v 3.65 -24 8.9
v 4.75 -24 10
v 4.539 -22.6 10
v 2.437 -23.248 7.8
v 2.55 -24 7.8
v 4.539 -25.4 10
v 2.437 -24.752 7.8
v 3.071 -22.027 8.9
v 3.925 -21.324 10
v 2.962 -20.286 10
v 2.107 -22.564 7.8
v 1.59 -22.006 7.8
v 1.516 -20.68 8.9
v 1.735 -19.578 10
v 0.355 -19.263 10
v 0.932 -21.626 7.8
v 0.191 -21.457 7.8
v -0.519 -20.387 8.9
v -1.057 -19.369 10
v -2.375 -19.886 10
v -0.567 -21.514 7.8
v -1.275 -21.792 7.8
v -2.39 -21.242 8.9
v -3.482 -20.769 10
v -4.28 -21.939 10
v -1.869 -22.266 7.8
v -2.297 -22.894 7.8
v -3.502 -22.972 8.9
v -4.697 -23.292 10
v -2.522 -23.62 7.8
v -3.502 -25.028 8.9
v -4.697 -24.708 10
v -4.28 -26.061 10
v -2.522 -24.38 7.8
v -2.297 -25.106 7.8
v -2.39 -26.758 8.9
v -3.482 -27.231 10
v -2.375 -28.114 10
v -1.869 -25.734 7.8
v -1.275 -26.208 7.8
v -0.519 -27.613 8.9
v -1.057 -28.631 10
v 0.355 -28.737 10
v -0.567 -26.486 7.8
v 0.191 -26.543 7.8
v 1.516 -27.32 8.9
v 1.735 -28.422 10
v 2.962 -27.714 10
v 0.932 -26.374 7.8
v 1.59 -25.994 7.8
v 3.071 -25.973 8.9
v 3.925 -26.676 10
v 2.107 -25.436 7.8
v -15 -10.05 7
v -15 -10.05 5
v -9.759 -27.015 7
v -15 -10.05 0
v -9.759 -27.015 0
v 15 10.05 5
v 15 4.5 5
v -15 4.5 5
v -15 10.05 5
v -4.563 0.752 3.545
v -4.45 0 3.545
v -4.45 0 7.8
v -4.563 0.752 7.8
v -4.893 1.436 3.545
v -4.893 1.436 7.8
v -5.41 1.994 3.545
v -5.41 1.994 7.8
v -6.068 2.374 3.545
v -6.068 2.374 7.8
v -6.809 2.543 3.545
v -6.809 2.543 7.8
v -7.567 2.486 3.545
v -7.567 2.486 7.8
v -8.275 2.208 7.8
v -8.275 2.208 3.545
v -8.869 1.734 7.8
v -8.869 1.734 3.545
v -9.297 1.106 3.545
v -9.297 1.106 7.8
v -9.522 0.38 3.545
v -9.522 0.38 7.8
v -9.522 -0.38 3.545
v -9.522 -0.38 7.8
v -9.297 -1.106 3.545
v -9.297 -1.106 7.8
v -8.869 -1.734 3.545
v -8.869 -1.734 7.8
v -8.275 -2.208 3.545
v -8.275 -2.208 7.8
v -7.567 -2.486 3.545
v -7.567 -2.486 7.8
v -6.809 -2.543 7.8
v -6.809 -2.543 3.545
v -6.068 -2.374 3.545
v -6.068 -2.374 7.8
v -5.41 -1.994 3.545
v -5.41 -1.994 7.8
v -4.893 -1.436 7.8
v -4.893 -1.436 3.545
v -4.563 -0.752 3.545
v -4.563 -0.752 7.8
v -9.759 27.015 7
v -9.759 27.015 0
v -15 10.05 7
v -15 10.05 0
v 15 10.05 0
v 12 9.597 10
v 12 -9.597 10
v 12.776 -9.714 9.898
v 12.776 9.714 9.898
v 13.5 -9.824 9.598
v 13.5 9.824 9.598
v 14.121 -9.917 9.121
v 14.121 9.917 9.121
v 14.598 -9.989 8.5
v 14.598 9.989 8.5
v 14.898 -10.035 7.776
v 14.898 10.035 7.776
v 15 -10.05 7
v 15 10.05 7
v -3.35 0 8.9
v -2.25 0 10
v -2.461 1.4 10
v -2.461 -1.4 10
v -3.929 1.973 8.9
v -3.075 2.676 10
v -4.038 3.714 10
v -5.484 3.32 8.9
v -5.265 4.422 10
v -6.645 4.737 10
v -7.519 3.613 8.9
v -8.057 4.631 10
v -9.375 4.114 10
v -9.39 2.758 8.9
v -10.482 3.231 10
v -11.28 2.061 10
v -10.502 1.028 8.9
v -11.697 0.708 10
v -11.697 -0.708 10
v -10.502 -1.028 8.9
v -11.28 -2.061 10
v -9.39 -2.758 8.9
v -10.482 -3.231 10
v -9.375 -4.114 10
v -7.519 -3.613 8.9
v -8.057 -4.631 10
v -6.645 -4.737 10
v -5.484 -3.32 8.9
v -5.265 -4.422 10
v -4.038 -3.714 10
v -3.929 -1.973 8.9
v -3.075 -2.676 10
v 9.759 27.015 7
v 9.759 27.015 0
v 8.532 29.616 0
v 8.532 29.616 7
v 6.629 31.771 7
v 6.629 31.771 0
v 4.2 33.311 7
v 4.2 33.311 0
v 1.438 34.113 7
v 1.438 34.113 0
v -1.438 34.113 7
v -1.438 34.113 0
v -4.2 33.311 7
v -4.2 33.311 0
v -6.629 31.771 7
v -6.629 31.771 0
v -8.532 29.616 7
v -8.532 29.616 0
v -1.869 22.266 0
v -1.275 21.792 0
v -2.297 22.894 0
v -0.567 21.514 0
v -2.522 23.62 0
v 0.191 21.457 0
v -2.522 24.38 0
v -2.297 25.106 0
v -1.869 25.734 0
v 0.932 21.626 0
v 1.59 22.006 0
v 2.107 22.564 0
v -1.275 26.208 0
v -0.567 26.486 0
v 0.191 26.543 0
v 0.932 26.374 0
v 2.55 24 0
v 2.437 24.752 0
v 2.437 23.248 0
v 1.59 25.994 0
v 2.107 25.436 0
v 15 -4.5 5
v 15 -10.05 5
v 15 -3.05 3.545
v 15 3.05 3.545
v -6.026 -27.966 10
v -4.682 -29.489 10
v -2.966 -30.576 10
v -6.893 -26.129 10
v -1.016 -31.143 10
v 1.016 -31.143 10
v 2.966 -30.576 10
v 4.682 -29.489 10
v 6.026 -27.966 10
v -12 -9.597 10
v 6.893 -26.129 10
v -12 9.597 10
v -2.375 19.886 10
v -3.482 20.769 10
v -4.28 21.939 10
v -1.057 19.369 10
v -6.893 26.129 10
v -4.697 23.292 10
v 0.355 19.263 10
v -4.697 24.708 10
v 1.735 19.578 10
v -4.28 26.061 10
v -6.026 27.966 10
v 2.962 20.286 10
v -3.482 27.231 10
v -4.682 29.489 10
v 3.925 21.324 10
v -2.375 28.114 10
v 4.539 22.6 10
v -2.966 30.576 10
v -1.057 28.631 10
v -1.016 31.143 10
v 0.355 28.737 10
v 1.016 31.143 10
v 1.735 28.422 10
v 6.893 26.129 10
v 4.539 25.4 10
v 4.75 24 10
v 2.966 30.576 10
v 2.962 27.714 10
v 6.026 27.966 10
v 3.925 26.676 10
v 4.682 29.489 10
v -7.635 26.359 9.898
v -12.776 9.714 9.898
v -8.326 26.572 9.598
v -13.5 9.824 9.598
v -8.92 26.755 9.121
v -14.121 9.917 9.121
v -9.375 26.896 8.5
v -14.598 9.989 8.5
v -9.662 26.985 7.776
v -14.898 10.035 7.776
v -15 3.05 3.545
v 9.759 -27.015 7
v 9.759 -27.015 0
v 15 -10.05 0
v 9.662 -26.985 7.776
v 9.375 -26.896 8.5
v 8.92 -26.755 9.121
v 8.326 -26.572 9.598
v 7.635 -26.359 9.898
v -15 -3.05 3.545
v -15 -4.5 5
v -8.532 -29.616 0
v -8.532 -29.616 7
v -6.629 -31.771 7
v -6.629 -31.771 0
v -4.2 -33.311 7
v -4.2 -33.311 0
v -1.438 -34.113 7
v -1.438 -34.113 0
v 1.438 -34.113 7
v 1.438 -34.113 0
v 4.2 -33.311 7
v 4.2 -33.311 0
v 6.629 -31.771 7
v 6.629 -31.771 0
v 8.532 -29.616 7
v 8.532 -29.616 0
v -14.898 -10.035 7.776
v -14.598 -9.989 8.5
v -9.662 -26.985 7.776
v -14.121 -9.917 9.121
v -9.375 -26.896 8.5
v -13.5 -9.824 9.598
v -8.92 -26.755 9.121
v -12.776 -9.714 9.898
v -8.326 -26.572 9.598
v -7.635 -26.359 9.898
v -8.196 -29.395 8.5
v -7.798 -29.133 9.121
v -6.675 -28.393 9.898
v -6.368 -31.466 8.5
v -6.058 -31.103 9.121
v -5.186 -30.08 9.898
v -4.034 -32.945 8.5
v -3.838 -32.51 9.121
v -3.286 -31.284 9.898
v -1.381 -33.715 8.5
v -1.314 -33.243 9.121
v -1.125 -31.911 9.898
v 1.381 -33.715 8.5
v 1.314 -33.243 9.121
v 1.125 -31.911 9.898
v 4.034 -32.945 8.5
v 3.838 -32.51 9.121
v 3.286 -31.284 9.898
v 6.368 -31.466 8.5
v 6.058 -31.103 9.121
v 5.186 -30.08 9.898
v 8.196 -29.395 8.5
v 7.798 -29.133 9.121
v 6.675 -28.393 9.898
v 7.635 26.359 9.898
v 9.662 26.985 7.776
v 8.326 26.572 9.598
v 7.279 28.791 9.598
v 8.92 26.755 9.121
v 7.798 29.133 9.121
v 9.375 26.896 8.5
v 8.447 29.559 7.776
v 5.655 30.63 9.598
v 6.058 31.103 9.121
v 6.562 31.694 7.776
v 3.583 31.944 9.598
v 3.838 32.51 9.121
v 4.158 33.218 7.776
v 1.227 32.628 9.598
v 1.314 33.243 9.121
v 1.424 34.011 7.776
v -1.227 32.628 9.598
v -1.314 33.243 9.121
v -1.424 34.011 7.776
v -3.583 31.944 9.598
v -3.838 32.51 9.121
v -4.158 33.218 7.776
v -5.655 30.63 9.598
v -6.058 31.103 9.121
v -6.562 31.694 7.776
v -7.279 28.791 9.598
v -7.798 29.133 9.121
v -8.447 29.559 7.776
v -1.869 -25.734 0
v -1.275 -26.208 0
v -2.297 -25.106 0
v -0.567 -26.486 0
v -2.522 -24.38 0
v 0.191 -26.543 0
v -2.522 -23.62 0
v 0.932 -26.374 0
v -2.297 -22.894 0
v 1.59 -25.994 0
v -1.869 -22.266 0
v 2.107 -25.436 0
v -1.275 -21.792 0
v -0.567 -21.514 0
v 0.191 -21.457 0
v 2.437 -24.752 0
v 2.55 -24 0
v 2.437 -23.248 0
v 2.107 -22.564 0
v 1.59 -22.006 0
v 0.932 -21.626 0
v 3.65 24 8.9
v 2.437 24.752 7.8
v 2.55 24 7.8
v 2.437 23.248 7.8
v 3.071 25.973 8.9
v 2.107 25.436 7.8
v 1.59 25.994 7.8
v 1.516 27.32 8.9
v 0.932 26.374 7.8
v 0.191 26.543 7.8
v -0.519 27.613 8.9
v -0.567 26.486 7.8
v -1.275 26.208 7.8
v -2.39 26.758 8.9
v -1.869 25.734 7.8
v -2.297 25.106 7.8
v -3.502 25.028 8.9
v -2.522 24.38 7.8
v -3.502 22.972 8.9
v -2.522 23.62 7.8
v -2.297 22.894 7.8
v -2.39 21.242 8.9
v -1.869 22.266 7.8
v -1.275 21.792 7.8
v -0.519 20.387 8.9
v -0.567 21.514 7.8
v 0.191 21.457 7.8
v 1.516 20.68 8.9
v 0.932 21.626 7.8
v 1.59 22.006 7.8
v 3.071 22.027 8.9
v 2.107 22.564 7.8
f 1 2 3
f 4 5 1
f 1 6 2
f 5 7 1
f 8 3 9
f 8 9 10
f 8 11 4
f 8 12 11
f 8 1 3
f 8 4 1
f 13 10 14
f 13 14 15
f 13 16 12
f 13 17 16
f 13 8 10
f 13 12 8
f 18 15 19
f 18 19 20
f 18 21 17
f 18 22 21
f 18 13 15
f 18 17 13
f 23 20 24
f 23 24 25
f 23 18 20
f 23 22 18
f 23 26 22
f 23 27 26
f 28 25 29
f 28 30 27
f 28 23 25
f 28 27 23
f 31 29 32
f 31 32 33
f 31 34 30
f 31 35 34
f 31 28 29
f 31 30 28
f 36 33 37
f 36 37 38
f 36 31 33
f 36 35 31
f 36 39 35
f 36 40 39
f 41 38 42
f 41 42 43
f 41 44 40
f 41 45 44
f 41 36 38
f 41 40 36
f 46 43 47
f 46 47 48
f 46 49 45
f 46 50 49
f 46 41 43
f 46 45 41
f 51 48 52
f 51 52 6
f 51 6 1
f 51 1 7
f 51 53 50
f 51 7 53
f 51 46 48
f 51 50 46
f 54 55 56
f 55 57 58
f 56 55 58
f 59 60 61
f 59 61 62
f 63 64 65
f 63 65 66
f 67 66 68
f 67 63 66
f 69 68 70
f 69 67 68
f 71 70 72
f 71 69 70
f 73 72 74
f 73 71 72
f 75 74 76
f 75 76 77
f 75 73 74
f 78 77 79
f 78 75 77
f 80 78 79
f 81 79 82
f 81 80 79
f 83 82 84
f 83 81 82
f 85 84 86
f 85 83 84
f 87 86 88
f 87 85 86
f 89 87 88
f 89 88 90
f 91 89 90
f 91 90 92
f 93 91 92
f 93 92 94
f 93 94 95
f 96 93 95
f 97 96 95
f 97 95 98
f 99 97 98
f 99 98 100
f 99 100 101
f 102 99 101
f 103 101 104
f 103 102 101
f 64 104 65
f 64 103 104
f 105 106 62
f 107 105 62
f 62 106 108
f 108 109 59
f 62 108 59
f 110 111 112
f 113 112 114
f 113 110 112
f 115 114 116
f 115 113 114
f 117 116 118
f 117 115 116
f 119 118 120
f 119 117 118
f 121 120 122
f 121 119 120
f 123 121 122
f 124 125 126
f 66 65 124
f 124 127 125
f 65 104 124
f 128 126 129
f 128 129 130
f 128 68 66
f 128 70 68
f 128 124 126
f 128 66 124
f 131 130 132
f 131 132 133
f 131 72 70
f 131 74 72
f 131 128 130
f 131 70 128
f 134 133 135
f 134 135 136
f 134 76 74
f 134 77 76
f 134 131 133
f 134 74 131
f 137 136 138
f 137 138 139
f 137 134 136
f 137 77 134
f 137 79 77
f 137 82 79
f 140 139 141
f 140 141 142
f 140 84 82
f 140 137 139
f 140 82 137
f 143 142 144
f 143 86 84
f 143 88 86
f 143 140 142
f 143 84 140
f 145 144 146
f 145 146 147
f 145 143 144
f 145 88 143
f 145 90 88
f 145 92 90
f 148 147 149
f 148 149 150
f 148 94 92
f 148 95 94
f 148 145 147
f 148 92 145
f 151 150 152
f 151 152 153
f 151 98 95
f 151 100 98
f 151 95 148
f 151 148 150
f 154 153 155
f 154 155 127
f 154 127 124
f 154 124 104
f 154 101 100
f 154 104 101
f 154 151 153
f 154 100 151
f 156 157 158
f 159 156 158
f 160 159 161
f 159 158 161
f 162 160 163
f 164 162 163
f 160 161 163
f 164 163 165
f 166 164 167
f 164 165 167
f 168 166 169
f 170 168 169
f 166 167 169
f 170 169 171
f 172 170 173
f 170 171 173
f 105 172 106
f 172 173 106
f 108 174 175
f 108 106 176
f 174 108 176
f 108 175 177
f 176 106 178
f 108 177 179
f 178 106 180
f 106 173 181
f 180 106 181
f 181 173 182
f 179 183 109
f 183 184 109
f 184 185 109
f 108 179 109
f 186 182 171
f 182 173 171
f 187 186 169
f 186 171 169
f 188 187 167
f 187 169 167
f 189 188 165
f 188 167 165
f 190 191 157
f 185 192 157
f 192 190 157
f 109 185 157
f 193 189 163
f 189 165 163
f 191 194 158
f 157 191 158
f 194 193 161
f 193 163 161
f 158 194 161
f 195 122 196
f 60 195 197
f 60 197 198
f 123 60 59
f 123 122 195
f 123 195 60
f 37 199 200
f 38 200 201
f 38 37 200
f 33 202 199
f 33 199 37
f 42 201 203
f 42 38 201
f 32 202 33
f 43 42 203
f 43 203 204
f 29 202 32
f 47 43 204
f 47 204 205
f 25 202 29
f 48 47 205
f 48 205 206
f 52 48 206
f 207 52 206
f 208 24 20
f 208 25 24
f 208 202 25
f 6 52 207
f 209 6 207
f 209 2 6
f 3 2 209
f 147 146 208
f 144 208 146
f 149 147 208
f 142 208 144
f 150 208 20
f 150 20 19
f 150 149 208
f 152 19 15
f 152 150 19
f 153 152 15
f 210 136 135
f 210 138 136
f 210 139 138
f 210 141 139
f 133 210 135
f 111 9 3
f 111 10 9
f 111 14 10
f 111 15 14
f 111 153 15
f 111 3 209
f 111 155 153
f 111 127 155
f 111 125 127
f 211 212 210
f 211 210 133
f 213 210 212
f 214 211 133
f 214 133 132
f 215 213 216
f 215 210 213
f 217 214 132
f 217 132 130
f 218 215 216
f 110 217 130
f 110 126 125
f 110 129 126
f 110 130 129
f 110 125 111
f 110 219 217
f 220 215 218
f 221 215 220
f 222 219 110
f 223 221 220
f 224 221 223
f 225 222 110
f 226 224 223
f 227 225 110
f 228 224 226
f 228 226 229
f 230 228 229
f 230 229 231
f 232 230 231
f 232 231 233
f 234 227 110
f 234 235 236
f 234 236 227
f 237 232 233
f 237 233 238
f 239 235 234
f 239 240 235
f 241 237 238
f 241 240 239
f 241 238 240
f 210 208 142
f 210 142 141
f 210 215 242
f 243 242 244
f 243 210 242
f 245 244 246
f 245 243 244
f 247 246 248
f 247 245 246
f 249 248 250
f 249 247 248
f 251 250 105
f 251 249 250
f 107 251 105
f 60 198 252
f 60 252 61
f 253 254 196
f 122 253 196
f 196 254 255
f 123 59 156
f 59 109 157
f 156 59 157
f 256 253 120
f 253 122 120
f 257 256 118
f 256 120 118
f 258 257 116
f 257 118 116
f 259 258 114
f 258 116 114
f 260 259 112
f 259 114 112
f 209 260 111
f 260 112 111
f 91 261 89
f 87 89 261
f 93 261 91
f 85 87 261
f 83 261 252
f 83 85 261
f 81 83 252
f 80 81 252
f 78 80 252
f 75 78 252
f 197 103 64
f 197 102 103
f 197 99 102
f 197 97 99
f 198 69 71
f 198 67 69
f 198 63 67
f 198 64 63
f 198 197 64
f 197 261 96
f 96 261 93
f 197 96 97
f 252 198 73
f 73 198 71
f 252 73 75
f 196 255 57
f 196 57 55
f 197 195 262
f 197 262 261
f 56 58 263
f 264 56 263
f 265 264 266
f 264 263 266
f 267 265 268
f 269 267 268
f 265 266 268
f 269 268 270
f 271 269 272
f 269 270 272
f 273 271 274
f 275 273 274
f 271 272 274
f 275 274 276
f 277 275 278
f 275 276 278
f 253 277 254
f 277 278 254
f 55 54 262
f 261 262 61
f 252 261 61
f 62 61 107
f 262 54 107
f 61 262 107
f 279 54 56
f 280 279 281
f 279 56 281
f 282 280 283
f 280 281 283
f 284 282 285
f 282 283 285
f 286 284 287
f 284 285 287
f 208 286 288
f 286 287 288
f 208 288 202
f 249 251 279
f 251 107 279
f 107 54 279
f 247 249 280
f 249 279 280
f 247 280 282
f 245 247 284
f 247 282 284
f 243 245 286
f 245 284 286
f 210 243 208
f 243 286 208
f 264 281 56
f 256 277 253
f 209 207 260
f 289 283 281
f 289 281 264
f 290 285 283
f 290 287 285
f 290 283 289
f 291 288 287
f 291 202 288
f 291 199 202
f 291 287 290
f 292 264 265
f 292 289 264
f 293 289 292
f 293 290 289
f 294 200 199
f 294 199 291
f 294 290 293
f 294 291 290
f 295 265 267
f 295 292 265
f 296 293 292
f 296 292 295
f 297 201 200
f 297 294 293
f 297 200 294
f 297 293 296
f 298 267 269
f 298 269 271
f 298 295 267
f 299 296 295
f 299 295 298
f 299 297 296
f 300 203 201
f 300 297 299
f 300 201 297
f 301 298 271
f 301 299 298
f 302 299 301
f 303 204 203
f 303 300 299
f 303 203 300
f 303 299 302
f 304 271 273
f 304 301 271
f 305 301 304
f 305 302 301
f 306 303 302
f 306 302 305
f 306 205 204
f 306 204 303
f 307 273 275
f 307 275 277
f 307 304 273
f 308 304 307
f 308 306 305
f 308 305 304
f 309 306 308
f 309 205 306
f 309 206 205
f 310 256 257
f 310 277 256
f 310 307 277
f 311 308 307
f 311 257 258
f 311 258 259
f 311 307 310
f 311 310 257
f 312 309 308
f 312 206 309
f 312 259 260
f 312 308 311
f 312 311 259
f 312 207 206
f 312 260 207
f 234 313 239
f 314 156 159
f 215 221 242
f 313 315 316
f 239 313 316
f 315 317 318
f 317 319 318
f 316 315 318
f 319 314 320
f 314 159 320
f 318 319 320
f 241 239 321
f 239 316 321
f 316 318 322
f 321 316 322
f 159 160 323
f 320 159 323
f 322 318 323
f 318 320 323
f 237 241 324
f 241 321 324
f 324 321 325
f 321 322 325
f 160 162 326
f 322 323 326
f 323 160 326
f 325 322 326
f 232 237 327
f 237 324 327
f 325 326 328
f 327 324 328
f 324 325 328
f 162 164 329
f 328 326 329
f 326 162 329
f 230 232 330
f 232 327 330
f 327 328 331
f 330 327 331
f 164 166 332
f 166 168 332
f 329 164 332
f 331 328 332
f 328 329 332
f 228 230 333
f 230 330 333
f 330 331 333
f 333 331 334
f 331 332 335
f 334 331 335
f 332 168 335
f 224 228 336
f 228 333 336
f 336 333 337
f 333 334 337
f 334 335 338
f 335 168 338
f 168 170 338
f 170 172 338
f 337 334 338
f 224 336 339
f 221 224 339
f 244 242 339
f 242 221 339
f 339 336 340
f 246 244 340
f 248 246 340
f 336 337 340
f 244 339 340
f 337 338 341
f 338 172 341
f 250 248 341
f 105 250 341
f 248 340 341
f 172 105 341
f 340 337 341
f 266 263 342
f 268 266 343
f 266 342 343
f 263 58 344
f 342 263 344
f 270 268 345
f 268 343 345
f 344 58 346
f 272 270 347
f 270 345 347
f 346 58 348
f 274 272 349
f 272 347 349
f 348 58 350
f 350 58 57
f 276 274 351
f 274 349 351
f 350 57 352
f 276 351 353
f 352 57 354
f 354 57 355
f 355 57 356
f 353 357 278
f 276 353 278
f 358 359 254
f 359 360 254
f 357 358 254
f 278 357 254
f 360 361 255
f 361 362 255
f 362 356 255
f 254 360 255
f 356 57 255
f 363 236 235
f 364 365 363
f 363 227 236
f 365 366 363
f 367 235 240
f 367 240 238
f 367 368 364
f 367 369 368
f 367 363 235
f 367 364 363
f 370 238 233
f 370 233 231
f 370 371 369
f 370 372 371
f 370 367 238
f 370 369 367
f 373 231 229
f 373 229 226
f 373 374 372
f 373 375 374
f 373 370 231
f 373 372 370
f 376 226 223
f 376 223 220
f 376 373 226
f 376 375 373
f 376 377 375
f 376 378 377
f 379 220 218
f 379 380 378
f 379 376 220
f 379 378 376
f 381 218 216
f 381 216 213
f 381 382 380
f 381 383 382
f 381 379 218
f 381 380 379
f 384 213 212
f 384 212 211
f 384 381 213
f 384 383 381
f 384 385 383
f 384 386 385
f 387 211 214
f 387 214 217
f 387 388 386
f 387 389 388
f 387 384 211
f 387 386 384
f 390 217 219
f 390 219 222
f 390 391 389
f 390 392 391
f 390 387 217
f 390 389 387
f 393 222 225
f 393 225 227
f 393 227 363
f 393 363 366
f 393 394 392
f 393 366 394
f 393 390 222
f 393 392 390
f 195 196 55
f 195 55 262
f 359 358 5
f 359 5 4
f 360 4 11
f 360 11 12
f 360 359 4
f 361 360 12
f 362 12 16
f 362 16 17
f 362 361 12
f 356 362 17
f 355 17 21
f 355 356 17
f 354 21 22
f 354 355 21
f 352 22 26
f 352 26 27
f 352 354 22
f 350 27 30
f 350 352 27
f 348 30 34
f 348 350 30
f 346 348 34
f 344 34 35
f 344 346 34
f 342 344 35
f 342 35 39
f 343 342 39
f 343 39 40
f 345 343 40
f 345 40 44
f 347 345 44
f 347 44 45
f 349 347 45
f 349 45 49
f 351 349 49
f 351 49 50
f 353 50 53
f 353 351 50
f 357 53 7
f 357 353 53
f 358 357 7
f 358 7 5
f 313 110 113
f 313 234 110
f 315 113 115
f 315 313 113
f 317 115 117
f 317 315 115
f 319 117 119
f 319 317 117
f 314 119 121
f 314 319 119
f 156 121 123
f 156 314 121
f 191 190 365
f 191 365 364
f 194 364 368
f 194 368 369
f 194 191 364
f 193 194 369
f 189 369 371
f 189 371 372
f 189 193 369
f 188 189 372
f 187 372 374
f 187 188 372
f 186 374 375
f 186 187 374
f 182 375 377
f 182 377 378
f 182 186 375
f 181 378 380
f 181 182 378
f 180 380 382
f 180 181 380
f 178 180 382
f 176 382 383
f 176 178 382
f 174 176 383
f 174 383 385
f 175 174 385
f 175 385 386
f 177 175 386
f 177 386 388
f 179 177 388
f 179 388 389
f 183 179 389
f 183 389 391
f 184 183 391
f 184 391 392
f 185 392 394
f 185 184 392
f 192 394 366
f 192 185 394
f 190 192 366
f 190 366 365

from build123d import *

# Parameters (mm, degrees)
F0_R     = 2.55
F1_DEPTH = 10
F2_W     = 20.1
F2_H     = 5
F3_DEPTH = 30.001
F5_DEPTH = 30
F6_DEPTH = 10
F7_R     = 3
F8_SIZE  = 2.2


# Not quite as in the source:
# - a feature names something its author has since deleted; it is built from what else it names


with BuildPart() as f1:
    # F0 (on Top) → F1 (new body)
    with BuildSketch(Plane.XY):
        with BuildLine():
            Line((-9.7593021288, 27.0148037464), (-15, 10.05))
            Line((-15, 10.05), (-15, -10.05))
            Line((-15, -10.05), (-9.7593021288, -27.0148037464))
            ThreePointArc((-9.7593021288, -27.0148037464), (0, -34.21435361), (9.7593021288, -27.0148037464))
            Line((9.7593021288, -27.0148037464), (15, -10.05))
            Line((15, -10.05), (15, 10.05))
            Line((15, 10.05), (9.7593021288, 27.0148037464))
            ThreePointArc((9.7593021288, 27.0148037464), (0, 34.21435361), (-9.7593021288, 27.0148037464))
        make_face()
        with Locations((-7, 0)):
            Circle(F0_R, mode=Mode.SUBTRACT)
        with Locations((0, 24)):
            Circle(F0_R, mode=Mode.SUBTRACT)
        with Locations((0, -24)):
            Circle(F0_R, mode=Mode.SUBTRACT)
    extrude(amount=F1_DEPTH)

    # F2 (on face) → F3 (cut, through all)
    with BuildSketch(Plane.YZ.offset(15)):
        with Locations((0, 2.5)):
            Rectangle(F2_W, F2_H)
    extrude(amount=-F3_DEPTH, mode=Mode.SUBTRACT)

    # F4 (on face) → F5 (join, through all)
    with BuildSketch(Plane.YZ.offset(15)):
        Polygon((3.05, 3.545), (4.5, 5), (-4.5, 5), (-3.05, 3.545), align=None)
    extrude(amount=-F5_DEPTH)

    # F0 (on Top) → F6 (cut, through all)
    with BuildSketch(Plane.XY):
        with Locations((-7, 0)):
            Circle(F0_R)
    extrude(amount=F6_DEPTH, mode=Mode.SUBTRACT)

    # F7
    f7_edges = [f1.edges().sort_by_distance(p)[0] for p in [
        (-12.379651, 18.532402, 10),
        (12.379651, 18.532402, 10),
        (12.379651, -18.532402, 10),
        (-12.379651, -18.532402, 10),
        (15, 0, 10),
        (-15, 0, 10),
    ]]
    fillet(f7_edges, radius=F7_R)

    # F8
    f8_edges = [f1.edges().sort_by_distance(p)[0] for p in [
        (-2.55, -24, 10),
        (-9.55, 0, 10),
        (-2.55, 24, 10),
    ]]
    chamfer(f8_edges, length=F8_SIZE)


solid = f1.part
